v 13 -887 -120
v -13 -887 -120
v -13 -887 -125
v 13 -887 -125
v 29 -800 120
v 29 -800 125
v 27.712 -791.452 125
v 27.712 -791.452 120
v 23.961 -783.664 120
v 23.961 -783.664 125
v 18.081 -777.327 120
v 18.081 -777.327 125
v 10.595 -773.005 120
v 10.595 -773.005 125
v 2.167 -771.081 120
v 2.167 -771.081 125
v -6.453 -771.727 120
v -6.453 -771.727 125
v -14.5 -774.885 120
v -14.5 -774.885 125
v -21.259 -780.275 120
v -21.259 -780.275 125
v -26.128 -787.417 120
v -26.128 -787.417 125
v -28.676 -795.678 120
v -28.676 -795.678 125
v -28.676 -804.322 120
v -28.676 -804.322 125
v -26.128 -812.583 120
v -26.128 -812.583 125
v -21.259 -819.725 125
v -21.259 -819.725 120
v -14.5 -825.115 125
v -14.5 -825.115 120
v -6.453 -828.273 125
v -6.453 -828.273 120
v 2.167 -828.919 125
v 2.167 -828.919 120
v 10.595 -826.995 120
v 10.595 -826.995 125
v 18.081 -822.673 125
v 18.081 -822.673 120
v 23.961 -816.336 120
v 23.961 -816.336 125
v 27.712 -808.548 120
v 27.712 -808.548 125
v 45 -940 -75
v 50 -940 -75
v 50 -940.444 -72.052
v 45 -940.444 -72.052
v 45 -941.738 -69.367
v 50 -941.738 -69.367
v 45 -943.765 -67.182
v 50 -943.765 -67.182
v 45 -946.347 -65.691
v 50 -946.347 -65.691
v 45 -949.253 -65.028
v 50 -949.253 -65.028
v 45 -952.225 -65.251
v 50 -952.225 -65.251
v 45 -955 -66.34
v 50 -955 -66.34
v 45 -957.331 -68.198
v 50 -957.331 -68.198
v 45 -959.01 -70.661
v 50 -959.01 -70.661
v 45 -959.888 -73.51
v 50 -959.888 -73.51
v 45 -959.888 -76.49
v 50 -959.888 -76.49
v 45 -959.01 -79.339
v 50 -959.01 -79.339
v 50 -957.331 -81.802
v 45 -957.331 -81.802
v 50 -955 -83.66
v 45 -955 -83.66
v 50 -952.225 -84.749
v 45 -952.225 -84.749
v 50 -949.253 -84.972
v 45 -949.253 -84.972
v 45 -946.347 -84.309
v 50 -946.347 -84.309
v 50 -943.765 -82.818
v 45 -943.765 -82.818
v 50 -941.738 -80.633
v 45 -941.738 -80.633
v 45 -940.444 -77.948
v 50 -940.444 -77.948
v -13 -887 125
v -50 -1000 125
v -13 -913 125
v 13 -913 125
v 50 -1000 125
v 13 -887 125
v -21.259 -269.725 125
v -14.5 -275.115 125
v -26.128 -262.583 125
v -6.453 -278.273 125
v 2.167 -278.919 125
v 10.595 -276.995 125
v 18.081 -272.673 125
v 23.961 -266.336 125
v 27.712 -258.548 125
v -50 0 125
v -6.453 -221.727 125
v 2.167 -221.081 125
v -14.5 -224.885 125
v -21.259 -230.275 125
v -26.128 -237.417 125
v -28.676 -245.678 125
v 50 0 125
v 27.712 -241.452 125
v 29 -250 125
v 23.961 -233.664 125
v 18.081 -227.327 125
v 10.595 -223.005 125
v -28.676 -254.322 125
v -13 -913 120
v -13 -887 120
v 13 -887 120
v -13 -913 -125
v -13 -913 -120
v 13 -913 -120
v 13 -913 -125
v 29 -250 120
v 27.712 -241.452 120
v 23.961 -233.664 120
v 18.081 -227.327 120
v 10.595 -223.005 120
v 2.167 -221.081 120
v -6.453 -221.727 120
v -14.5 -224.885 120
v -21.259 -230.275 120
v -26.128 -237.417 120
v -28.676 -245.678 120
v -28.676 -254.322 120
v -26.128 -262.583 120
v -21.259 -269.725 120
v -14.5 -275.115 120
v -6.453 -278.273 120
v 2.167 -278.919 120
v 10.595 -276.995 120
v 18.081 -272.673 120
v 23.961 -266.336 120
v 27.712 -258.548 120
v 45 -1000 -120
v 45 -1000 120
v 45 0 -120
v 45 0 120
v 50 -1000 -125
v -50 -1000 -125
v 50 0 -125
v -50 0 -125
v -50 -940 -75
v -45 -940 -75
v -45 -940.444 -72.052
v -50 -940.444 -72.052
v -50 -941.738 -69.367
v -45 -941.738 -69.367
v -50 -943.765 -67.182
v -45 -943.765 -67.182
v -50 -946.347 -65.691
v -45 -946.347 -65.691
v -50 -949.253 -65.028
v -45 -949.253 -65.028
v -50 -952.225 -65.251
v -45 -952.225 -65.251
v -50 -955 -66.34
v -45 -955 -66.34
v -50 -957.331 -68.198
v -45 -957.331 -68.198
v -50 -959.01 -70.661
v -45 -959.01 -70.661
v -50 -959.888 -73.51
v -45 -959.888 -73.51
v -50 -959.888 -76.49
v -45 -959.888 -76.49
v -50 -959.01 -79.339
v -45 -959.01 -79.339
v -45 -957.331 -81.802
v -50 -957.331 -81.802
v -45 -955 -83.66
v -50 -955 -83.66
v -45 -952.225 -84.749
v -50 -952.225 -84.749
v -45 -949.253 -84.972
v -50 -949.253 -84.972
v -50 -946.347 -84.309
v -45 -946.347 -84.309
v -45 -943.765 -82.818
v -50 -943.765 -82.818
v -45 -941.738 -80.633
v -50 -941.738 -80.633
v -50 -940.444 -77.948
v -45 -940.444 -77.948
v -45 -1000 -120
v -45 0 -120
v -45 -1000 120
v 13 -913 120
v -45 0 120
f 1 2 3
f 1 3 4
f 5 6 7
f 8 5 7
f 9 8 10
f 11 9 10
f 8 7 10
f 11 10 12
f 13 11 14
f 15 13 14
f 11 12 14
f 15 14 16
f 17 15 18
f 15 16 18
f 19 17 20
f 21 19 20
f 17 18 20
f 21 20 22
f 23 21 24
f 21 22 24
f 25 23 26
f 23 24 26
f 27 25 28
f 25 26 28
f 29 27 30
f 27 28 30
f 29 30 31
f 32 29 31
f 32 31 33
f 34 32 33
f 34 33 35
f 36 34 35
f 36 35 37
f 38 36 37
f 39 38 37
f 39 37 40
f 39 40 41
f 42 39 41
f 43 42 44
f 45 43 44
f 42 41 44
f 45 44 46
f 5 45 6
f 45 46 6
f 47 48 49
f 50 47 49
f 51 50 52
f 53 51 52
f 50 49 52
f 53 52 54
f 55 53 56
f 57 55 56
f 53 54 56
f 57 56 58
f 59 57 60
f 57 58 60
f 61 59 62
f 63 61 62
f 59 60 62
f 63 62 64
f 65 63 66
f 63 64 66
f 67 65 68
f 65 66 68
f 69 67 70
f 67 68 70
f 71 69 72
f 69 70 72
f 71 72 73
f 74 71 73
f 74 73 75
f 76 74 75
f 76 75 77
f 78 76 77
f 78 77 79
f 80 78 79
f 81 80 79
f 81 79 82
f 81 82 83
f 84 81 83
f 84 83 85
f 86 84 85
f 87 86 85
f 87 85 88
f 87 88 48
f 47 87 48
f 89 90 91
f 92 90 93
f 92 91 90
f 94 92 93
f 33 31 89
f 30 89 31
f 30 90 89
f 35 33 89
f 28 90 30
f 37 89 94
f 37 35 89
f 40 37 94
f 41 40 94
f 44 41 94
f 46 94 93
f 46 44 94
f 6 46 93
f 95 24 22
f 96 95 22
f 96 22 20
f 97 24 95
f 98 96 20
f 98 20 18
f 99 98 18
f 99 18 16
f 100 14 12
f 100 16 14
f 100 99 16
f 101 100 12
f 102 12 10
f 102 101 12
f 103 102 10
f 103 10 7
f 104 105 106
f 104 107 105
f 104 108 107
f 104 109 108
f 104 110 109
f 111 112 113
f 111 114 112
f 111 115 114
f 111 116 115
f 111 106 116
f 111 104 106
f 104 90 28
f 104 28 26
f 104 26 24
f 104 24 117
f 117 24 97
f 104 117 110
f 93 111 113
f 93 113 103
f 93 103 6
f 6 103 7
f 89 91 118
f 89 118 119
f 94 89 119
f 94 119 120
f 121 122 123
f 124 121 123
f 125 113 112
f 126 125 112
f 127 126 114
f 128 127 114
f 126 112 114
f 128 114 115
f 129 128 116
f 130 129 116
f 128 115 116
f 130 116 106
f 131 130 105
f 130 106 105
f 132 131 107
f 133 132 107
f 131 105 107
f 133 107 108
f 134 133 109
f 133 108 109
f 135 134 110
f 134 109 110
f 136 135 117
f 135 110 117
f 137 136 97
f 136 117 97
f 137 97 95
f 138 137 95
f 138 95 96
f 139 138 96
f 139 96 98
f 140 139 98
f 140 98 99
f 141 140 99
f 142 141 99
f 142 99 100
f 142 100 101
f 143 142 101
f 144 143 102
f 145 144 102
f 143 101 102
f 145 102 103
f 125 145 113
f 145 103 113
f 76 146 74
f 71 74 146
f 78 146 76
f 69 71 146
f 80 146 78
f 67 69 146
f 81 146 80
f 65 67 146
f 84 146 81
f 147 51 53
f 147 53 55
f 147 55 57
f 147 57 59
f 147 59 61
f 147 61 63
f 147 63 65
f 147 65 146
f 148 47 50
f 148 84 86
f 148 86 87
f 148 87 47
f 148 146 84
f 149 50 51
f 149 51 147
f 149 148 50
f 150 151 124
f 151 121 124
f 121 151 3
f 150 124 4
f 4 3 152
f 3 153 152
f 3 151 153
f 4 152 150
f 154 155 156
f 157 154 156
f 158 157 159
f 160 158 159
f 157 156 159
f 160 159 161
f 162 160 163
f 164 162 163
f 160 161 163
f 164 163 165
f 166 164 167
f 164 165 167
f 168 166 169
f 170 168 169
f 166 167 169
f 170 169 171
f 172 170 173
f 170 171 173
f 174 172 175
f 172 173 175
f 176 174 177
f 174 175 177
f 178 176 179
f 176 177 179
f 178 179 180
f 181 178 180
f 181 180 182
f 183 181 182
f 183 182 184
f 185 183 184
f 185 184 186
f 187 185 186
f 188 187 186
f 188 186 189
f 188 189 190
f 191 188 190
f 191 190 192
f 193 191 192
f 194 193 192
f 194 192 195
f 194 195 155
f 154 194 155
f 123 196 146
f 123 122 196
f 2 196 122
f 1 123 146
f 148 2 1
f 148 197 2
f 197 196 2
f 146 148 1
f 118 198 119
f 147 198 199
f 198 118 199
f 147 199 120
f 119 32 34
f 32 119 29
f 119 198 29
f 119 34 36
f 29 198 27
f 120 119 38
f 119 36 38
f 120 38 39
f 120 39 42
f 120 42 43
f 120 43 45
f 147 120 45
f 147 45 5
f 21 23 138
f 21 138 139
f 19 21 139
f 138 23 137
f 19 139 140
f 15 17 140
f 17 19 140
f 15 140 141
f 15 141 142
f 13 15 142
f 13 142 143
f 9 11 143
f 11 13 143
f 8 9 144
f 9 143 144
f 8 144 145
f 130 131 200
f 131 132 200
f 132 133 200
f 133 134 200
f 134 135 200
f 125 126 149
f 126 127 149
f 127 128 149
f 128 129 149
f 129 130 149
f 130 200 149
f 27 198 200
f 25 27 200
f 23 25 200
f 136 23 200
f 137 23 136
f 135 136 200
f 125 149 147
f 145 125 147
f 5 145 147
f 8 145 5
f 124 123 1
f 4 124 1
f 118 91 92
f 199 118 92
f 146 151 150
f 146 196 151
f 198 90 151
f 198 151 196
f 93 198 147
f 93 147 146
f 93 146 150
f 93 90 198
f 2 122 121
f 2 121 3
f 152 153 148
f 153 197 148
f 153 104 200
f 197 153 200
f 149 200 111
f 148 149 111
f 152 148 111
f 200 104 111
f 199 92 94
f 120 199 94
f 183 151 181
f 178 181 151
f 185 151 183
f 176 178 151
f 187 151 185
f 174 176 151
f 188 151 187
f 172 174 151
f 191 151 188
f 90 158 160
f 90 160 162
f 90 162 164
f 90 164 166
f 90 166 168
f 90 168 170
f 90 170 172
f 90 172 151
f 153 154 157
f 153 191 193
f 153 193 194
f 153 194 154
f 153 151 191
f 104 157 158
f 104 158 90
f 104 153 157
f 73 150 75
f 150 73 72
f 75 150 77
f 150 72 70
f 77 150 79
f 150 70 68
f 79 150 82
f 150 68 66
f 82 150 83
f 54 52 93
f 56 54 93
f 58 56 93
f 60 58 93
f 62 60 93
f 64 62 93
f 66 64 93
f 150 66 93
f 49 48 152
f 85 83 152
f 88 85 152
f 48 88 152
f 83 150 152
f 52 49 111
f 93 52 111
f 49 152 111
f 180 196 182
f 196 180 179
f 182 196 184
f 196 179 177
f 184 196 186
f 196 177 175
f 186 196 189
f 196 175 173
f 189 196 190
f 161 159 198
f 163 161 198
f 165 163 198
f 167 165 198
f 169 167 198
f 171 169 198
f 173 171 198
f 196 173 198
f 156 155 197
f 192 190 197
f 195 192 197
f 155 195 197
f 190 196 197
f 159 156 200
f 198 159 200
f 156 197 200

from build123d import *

# Parameters (mm, degrees)
F0_W     = 100
F0_H     = 250
F0_W_2   = 90
F0_H_2   = 240
F1_DEPTH = 1000
F2_R     = 10
F3_DEPTH = 100.001
F4_R     = 29
F5_R     = 29
F6_DEPTH = 5
F7_W     = 26
F7_H     = 26
F8_DEPTH = 250.001


# Not quite as in the source:
# - a feature names something its author has since deleted; it is built from what else it names


with BuildPart() as f1:
    # F0 (on Front) → F1 (new body)
    with BuildSketch(Plane.XZ):
        Rectangle(F0_W, F0_H)
        Rectangle(F0_W_2, F0_H_2, mode=Mode.SUBTRACT)
    extrude(amount=F1_DEPTH)

    # F2 (on face) → F3 (cut, through all)
    with BuildSketch(Plane.YZ.offset(50)):
        with Locations((-950, -75)):
            Circle(F2_R)
    extrude(amount=-F3_DEPTH, mode=Mode.SUBTRACT)

    # F4 (on face) + F5 (on face) → F6 (cut, through all)
    with BuildSketch(Plane.XY.offset(125)):
        with Locations((0, -800)):
            Circle(F4_R)
    with BuildSketch(Plane.XY.offset(125)):
        with Locations((0, -250)):
            Circle(F5_R)
    extrude(amount=-F6_DEPTH, mode=Mode.SUBTRACT)

    # F7 (on face) → F8 (cut, through all)
    with BuildSketch(Plane.XY.offset(125)):
        with Locations((0, -900)):
            Rectangle(F7_W, F7_H)
    extrude(amount=-F8_DEPTH, mode=Mode.SUBTRACT)


solid = f1.part
